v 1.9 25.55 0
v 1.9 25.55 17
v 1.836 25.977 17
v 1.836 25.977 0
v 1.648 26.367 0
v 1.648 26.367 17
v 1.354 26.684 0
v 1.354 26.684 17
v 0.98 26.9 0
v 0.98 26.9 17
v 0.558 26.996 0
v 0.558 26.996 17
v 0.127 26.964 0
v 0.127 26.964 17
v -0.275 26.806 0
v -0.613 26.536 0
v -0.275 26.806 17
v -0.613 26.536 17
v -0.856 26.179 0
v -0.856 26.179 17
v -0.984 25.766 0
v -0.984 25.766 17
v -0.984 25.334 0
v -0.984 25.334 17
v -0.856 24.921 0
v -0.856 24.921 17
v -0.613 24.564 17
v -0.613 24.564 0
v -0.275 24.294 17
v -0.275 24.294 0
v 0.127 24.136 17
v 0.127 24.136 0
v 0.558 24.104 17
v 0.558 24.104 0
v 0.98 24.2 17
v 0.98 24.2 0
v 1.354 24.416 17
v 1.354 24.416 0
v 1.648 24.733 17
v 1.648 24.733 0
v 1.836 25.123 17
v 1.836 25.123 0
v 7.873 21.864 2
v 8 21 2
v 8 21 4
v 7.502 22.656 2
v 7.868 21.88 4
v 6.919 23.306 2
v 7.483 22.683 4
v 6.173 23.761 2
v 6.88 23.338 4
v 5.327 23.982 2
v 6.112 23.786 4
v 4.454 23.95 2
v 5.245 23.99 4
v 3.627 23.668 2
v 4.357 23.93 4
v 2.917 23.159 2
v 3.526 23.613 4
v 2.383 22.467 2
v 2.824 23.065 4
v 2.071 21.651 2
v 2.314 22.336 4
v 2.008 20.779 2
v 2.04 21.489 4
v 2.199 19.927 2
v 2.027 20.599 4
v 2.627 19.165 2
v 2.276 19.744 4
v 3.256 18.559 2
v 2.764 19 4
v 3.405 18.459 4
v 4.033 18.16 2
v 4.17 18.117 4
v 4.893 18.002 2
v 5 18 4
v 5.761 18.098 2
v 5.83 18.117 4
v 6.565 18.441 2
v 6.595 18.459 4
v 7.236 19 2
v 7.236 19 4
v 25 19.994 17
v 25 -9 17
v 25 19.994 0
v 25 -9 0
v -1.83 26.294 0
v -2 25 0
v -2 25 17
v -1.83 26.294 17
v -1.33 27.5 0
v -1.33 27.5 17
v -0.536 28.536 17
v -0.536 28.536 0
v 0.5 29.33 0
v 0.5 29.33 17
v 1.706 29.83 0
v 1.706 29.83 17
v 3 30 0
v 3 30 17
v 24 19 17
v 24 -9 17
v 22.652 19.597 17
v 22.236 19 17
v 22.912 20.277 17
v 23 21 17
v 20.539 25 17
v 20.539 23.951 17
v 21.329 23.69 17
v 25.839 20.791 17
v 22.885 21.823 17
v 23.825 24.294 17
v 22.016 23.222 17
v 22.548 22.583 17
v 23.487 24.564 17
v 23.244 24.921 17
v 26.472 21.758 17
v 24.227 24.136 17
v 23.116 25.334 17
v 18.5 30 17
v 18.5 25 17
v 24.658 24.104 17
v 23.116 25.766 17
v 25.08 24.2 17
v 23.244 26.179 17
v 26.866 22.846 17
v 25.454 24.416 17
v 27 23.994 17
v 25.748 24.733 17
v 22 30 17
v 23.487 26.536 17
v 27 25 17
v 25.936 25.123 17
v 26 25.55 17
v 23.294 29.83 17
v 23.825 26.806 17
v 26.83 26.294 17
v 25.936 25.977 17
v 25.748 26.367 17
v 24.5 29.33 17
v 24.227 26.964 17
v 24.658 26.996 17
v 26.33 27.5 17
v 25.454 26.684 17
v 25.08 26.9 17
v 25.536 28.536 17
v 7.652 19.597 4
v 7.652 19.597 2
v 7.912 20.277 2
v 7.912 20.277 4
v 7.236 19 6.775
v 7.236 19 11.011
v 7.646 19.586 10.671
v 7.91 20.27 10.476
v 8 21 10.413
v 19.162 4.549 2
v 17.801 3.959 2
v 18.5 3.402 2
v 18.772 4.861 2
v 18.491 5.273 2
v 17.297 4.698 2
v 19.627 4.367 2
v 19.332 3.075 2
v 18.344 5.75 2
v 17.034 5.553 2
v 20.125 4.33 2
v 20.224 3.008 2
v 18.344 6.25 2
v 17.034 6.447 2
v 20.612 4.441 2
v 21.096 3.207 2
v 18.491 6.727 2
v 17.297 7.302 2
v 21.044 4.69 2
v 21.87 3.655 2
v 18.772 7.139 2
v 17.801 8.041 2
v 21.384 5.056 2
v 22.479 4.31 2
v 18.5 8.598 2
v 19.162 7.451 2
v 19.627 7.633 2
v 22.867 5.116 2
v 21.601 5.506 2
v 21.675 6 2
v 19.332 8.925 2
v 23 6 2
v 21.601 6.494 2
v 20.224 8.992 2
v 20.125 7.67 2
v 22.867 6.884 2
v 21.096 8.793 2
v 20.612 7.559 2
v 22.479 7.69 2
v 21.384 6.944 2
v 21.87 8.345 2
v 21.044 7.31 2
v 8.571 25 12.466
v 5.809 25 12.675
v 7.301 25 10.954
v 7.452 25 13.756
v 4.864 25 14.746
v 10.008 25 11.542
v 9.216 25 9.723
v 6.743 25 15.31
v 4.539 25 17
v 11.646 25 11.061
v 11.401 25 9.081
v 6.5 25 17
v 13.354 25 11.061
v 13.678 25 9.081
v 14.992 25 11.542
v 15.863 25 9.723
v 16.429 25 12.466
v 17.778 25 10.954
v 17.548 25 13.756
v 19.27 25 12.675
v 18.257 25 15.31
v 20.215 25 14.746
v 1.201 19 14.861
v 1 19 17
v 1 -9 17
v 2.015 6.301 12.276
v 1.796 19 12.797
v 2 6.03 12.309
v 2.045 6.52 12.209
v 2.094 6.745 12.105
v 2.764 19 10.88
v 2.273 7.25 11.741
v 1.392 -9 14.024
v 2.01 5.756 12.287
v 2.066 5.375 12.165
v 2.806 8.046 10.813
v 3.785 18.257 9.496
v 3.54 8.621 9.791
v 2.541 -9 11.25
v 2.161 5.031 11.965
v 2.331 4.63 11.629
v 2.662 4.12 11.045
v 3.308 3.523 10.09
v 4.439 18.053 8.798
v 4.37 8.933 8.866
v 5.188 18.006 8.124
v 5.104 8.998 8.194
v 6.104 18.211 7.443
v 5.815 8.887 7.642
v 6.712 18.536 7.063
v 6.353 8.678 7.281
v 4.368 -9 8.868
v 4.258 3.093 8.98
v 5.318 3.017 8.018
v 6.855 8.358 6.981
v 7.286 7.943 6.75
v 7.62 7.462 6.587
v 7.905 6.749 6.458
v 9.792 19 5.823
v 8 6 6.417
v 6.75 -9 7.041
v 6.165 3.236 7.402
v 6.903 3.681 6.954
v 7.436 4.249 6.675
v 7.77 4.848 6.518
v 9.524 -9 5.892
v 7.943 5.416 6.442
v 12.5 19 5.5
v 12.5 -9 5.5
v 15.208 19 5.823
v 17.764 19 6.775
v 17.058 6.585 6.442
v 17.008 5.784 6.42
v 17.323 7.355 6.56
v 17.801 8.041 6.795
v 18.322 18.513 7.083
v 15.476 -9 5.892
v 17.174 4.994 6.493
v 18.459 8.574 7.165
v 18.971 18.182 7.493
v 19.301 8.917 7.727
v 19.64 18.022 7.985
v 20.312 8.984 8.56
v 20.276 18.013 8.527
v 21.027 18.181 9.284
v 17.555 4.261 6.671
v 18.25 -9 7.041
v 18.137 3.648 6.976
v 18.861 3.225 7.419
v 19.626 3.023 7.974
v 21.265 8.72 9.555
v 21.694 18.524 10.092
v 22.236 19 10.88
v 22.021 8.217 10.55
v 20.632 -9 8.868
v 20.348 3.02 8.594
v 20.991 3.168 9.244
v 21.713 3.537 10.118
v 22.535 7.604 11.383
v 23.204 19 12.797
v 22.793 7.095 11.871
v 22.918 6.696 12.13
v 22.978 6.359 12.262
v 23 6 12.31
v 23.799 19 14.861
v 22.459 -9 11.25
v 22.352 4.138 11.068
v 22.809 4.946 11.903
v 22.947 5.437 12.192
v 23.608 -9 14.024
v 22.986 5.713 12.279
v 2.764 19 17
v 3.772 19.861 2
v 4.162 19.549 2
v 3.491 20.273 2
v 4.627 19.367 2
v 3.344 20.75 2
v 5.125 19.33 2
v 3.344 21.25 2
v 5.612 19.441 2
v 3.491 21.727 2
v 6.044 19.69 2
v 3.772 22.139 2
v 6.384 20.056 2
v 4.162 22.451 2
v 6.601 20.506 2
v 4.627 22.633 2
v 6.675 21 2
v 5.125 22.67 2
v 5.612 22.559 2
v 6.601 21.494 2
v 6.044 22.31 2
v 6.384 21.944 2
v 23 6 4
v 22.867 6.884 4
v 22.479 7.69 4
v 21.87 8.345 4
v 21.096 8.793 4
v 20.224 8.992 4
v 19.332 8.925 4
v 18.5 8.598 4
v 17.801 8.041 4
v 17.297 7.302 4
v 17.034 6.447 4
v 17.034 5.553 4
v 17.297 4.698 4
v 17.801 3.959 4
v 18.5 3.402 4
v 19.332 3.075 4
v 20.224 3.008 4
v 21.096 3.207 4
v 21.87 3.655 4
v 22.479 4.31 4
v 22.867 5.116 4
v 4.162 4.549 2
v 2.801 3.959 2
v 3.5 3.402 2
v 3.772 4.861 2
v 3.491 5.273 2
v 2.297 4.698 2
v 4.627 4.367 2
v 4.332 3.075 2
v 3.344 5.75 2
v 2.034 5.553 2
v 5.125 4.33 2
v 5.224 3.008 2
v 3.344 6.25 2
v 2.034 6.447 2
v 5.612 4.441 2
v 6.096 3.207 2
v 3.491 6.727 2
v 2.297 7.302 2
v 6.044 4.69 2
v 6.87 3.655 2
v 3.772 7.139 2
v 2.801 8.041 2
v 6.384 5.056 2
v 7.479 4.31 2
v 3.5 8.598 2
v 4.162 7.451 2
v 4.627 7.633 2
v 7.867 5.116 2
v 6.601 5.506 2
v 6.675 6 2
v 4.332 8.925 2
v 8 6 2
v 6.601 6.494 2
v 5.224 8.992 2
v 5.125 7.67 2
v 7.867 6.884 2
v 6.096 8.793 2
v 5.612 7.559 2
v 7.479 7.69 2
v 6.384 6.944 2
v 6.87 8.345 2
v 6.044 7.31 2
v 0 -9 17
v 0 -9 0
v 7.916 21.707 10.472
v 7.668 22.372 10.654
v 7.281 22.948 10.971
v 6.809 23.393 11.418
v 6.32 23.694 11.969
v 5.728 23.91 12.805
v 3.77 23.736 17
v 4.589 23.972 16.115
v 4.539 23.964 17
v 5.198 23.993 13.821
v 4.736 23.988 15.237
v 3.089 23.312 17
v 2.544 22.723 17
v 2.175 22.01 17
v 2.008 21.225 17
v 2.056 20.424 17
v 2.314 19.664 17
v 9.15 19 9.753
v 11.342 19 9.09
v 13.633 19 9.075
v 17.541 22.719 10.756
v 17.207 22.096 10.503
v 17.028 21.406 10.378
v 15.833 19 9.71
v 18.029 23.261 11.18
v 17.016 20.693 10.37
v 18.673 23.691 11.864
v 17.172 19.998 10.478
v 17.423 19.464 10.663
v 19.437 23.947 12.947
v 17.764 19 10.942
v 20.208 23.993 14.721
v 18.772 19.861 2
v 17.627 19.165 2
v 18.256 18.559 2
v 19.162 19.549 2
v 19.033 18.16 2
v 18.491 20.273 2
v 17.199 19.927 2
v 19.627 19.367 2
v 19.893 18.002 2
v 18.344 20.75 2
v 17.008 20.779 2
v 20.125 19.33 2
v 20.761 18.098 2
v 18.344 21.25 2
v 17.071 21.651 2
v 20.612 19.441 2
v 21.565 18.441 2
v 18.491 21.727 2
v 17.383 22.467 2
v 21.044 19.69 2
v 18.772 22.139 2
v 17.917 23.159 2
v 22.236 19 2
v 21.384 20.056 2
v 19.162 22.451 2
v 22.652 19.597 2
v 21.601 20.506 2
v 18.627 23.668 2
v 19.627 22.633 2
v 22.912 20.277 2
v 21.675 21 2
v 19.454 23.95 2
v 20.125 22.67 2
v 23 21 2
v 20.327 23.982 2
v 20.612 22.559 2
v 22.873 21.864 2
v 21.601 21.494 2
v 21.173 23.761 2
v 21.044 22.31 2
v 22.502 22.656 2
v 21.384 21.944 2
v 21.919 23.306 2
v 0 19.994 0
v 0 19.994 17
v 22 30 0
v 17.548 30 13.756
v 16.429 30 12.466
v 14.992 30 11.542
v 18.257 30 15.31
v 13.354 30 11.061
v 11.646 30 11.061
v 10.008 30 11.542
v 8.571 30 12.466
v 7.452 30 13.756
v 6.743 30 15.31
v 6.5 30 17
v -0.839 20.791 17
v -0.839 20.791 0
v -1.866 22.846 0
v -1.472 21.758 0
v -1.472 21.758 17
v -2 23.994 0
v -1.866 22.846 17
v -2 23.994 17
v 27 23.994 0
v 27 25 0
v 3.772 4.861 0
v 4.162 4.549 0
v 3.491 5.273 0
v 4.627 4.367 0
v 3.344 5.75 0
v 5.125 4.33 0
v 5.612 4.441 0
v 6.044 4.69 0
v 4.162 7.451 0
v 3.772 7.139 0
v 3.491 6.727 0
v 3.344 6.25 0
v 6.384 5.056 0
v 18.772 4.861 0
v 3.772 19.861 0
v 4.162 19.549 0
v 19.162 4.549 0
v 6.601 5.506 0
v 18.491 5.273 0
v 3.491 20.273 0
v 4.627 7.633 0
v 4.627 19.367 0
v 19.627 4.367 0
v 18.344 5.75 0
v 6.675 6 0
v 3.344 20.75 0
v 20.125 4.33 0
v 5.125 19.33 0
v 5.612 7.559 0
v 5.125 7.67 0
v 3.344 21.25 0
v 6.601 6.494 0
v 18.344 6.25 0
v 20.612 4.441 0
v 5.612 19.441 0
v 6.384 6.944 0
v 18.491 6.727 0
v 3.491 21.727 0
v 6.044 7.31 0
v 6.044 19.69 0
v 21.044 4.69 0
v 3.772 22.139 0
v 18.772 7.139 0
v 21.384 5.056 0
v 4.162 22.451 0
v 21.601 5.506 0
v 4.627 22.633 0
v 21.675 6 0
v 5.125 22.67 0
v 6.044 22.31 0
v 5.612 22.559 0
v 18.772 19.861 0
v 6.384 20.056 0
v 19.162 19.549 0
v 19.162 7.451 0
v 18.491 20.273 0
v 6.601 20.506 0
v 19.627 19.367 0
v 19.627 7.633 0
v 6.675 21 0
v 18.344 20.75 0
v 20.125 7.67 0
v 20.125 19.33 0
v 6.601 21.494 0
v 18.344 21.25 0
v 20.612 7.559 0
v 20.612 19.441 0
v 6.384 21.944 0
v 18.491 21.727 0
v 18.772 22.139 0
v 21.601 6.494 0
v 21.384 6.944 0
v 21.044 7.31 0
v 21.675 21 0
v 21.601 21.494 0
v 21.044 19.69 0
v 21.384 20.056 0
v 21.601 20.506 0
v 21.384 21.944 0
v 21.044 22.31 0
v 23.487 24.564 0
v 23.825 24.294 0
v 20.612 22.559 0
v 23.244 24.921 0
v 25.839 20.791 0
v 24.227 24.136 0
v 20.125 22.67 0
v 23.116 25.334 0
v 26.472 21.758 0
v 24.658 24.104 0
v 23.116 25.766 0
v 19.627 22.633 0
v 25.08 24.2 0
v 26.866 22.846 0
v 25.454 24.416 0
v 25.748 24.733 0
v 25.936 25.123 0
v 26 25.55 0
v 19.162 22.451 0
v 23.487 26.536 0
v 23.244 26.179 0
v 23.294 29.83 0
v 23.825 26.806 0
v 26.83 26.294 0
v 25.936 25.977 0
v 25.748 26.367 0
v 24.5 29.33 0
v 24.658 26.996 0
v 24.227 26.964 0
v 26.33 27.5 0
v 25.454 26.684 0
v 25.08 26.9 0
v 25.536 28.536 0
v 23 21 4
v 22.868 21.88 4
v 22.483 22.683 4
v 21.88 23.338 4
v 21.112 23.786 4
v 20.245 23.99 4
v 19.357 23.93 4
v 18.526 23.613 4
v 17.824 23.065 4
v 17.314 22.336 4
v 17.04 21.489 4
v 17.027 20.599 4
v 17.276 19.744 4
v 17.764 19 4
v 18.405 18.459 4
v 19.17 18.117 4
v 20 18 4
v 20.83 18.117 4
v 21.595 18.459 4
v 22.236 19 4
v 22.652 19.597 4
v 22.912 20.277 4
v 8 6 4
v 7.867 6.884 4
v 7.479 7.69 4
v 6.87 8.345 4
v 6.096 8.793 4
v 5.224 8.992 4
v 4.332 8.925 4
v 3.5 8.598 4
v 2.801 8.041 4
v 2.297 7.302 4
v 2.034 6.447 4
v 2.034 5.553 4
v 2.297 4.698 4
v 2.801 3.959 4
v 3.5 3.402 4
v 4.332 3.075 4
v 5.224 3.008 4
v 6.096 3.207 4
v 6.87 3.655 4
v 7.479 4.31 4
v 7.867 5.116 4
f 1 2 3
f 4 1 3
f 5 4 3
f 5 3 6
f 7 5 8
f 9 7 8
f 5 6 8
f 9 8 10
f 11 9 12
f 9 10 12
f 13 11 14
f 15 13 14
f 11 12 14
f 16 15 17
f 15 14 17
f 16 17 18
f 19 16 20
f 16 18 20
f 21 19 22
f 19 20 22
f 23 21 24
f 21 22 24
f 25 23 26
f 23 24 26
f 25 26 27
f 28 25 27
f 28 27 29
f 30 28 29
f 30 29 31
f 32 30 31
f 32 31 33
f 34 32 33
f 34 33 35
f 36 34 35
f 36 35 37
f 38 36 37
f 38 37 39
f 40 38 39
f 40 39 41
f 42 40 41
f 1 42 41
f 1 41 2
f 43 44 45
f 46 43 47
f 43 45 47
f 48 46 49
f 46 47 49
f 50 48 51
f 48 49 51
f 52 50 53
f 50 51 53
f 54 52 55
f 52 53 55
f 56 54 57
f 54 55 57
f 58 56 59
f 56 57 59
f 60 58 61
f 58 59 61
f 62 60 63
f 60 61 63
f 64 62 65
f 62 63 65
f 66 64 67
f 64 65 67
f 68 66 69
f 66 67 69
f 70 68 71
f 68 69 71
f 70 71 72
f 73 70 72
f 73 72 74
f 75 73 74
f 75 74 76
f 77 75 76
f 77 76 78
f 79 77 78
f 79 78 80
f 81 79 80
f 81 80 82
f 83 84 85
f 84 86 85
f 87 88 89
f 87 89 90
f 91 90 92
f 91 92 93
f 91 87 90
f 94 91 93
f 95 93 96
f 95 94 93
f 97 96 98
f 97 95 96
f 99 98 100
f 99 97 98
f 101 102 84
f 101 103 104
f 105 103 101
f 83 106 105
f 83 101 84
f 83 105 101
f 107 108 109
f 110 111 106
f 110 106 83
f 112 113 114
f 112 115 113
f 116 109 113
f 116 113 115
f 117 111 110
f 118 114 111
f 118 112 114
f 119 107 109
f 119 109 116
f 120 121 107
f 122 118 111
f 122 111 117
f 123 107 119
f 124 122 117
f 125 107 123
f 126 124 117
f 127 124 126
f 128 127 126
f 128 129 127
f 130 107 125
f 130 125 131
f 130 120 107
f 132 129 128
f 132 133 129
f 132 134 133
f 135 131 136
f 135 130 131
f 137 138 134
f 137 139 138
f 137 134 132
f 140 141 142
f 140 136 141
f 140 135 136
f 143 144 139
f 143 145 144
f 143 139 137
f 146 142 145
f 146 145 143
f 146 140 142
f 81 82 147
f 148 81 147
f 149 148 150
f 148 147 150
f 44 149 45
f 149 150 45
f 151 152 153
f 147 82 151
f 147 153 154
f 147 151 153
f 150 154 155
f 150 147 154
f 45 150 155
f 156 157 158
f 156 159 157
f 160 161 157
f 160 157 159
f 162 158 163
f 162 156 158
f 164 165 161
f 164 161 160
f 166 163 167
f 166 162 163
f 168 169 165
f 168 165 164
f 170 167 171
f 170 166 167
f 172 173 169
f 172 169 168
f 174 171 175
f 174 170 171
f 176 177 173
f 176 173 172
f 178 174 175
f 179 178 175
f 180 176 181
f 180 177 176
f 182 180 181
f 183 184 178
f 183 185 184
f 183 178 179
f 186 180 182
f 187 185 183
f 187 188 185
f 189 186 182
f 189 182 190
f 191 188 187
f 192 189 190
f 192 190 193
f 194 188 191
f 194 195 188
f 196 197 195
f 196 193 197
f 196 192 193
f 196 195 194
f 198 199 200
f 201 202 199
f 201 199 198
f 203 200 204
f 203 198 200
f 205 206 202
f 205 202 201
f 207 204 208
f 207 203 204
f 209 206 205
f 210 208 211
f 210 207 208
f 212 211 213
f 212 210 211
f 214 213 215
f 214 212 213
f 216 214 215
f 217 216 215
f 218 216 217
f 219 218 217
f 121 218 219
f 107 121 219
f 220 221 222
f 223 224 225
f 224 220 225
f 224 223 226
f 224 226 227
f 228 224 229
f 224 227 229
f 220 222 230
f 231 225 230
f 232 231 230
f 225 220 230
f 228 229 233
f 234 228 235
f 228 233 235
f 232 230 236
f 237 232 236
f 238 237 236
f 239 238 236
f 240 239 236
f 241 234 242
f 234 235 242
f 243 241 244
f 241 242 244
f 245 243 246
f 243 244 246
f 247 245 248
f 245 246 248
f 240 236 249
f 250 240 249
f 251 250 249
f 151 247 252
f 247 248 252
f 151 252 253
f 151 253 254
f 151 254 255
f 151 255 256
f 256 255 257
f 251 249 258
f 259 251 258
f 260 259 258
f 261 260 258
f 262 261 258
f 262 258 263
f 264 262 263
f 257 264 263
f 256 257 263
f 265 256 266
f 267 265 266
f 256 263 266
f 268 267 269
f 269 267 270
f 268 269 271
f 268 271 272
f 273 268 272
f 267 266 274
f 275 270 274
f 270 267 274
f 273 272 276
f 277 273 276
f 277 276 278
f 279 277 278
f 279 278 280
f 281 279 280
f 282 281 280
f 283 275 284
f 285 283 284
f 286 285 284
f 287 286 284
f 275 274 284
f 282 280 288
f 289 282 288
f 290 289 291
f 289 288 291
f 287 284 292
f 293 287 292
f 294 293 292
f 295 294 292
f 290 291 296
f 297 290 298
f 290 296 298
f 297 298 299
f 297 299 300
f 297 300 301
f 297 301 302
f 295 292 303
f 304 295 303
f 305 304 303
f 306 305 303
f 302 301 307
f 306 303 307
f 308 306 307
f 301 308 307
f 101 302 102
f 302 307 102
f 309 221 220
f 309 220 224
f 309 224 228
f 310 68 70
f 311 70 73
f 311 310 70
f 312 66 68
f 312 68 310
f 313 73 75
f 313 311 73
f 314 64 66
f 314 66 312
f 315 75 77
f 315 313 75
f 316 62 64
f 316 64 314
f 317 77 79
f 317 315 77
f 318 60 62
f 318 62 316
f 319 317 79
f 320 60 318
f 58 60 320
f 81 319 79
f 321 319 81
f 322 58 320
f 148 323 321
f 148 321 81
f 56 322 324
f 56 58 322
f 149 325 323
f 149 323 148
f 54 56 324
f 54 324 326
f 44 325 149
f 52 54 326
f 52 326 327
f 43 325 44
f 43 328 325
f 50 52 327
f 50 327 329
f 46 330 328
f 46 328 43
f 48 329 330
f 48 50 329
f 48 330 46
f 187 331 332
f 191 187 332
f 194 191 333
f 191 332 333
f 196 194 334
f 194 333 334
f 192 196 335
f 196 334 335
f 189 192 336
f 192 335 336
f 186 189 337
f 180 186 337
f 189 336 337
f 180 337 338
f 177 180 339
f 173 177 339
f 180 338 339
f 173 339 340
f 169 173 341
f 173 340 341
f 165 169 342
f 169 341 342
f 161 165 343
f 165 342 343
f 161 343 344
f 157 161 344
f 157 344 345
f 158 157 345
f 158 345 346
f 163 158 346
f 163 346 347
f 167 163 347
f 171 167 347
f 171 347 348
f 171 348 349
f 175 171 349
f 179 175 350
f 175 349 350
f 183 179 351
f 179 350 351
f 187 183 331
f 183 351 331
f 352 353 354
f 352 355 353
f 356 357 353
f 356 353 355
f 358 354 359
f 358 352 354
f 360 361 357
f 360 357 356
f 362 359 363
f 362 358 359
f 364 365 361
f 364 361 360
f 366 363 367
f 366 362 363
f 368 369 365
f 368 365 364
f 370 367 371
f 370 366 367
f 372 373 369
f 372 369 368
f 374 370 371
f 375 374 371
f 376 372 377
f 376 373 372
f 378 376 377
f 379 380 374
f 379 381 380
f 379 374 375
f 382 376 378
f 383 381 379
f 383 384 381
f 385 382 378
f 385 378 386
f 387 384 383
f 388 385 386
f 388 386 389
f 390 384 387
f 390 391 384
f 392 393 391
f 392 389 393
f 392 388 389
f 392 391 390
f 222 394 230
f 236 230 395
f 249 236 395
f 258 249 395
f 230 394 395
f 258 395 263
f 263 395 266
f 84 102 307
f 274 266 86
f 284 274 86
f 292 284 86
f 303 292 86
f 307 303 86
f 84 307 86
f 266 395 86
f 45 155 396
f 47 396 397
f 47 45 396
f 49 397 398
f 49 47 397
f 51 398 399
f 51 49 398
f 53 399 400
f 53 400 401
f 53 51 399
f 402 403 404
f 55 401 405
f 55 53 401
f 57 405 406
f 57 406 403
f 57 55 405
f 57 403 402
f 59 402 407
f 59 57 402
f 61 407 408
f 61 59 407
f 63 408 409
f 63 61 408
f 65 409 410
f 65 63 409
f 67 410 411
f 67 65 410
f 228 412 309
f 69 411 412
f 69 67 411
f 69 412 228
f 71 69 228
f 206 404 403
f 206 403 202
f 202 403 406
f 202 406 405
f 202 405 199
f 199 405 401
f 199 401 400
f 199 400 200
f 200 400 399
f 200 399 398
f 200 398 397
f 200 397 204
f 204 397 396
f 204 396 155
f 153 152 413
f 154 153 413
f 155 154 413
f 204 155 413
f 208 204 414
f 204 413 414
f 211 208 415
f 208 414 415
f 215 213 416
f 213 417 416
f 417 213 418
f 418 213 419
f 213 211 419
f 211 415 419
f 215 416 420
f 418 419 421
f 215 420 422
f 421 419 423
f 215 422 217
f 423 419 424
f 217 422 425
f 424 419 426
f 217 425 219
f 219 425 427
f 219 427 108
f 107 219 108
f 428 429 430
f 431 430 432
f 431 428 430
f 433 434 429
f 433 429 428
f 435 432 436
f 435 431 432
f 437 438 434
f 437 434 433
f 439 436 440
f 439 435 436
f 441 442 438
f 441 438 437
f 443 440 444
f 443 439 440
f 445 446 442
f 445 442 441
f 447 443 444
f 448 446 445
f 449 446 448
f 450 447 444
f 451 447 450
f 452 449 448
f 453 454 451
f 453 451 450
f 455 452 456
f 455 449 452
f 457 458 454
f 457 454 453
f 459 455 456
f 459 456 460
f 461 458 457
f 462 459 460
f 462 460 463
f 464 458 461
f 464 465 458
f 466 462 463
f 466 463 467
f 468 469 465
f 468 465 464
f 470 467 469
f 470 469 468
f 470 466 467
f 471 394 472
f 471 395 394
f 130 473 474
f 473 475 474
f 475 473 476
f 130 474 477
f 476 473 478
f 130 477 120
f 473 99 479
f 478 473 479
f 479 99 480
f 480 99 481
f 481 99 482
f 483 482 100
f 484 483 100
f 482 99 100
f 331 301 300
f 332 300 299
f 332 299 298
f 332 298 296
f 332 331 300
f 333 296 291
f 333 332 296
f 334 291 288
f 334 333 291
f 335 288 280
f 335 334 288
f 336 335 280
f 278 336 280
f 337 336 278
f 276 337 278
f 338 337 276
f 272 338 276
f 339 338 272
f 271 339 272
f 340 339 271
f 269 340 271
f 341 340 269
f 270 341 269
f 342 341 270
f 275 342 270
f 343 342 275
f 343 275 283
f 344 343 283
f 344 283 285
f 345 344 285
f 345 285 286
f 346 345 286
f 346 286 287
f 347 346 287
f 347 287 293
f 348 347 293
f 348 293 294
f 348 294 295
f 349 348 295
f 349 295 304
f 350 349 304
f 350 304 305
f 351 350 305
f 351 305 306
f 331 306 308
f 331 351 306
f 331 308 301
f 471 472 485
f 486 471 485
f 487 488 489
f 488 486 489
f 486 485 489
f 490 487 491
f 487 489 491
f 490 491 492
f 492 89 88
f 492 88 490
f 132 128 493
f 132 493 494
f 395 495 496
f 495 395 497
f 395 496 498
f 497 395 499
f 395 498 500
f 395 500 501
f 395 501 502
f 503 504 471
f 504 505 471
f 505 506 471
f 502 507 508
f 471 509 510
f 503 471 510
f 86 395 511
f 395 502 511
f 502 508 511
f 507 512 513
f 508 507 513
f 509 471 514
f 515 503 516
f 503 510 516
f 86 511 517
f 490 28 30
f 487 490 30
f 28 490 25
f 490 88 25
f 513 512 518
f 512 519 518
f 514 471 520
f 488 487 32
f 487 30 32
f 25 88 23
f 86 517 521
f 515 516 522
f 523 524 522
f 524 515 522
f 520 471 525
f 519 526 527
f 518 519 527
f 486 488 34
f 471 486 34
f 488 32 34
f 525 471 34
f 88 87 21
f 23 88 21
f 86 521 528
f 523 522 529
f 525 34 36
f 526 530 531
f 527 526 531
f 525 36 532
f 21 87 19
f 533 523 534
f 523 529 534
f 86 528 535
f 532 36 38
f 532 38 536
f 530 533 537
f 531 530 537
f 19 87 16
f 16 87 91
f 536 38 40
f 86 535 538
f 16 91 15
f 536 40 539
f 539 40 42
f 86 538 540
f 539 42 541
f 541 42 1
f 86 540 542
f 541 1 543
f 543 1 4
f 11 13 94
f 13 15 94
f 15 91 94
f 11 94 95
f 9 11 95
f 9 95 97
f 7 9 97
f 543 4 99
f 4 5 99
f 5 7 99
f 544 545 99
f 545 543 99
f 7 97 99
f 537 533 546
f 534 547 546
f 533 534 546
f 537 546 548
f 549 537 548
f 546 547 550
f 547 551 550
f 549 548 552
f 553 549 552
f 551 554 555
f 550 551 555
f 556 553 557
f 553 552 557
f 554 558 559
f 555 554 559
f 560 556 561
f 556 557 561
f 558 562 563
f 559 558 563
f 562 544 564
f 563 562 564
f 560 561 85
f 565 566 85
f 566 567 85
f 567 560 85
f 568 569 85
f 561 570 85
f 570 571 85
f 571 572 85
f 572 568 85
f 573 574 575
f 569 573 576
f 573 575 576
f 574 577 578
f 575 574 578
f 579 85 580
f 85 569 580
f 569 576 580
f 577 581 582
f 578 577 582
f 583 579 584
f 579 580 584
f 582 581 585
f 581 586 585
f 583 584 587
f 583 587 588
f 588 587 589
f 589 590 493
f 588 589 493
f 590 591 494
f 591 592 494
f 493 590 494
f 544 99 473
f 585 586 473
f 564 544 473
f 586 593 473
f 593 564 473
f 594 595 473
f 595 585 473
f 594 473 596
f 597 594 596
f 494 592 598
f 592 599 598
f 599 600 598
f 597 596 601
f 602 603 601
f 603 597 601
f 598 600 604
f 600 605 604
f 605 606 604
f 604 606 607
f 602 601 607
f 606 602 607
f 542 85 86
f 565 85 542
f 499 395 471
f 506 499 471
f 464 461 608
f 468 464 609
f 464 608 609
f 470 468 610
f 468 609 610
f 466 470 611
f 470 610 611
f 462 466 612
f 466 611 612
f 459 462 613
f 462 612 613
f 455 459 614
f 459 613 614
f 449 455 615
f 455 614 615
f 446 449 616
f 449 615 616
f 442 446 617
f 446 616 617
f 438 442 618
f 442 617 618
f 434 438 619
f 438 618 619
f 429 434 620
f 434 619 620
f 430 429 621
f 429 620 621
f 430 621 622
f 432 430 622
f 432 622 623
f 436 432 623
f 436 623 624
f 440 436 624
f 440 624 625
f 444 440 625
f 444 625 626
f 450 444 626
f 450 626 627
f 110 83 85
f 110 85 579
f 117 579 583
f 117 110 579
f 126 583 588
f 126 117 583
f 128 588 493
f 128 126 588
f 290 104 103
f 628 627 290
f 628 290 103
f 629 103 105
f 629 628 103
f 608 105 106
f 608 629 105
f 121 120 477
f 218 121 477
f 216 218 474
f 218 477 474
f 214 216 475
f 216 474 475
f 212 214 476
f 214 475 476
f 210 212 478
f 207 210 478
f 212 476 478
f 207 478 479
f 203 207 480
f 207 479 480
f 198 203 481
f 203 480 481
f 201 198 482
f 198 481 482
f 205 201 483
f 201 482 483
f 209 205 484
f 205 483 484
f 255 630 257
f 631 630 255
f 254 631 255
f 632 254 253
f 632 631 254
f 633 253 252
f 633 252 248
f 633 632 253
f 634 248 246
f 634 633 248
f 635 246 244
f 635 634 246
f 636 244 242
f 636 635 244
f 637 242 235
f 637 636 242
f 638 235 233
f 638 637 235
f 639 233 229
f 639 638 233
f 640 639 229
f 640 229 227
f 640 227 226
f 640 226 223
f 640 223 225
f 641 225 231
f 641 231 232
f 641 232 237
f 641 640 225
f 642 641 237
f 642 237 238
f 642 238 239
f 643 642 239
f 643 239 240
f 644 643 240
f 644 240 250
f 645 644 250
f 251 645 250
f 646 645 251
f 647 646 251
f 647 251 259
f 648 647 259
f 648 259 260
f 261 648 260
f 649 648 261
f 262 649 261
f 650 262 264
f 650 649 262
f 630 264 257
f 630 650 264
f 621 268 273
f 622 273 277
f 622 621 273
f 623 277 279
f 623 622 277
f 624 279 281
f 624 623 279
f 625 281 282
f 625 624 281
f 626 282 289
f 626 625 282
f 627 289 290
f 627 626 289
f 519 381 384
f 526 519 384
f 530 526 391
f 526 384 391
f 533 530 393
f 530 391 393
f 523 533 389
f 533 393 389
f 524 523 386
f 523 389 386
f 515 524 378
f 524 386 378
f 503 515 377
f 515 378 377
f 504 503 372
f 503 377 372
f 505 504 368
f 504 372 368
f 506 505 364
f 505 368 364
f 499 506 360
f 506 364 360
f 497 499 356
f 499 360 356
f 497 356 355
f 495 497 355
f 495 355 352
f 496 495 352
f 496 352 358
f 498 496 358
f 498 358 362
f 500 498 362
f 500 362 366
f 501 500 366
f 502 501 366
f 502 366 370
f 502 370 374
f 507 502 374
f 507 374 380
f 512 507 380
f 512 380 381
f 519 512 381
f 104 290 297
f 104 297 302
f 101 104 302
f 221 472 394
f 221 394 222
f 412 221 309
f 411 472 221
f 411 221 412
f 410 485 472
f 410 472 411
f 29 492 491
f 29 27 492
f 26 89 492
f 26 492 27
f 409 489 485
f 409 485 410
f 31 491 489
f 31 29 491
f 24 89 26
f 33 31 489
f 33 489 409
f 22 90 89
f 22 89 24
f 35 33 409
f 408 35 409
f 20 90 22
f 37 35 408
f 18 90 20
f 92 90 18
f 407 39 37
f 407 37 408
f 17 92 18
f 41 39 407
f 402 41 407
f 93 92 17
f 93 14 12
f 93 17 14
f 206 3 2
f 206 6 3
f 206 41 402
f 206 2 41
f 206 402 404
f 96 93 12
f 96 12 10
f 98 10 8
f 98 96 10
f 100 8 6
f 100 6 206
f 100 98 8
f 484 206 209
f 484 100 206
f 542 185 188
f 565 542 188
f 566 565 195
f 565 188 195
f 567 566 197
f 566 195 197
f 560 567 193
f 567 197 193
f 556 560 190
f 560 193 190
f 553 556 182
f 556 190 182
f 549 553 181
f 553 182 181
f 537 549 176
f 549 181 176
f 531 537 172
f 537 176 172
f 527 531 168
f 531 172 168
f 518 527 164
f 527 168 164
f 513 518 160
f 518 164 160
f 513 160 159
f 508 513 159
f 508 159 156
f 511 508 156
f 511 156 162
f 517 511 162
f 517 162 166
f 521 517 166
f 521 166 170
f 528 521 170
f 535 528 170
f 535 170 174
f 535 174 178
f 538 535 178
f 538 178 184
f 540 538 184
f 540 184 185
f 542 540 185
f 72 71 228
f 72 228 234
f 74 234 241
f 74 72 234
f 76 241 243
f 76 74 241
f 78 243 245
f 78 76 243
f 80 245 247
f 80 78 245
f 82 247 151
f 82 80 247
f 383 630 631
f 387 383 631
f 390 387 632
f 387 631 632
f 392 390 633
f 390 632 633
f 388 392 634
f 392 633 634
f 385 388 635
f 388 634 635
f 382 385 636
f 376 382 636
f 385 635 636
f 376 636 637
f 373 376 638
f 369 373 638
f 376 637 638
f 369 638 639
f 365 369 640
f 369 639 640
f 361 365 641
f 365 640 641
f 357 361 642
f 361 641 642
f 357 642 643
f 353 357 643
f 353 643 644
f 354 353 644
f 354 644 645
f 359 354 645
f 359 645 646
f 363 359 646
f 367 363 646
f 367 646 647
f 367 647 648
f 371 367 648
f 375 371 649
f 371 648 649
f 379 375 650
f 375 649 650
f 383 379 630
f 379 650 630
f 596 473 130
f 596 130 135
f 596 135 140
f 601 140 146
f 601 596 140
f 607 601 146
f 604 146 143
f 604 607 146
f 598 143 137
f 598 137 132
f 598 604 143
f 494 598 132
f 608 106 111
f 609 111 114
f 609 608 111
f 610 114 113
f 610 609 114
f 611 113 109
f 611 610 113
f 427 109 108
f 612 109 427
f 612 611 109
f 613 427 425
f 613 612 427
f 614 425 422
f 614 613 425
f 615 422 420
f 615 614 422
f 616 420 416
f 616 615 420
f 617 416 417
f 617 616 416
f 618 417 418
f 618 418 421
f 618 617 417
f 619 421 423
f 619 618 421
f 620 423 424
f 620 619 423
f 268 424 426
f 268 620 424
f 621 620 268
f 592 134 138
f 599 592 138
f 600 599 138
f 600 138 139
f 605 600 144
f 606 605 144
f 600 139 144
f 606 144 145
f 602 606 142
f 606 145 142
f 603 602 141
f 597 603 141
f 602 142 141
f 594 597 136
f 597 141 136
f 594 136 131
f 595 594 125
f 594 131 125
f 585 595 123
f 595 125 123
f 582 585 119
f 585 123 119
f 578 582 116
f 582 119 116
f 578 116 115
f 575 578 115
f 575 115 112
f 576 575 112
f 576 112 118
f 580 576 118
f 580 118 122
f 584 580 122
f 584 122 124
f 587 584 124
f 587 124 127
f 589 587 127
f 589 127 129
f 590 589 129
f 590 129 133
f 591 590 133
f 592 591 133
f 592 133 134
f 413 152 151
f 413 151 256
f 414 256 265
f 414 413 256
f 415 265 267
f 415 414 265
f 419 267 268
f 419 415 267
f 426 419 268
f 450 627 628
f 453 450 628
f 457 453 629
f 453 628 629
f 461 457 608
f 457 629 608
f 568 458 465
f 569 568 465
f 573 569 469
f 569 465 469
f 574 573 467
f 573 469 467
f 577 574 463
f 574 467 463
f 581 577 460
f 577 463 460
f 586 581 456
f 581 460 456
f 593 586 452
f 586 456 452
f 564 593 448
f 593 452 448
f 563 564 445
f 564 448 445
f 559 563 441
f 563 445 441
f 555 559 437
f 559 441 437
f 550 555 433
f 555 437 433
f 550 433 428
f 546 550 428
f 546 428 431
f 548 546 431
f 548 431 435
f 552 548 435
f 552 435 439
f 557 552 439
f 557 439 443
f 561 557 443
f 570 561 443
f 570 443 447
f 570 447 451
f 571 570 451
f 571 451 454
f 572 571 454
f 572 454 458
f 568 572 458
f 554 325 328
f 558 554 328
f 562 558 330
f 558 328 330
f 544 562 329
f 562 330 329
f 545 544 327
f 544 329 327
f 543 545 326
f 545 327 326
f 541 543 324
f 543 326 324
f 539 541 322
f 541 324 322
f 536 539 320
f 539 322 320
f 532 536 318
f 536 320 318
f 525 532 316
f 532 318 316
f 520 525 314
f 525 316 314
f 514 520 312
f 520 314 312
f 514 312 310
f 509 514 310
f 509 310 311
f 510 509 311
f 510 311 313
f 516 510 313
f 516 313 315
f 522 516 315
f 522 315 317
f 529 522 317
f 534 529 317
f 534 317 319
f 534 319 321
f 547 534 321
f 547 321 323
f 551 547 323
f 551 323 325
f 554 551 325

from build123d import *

# Parameters (mm, degrees)
F0_W           = 25
F0_H           = 30
F1_DEPTH       = 4
F2_W           = 25
F2_H           = 11
F3_DEPTH       = 13
F4_R           = 1.675
F5_DEPTH       = 25
F5_DEPTH_BACK  = 25
F7_DEPTH       = 6
F8_R           = 8
F9_DEPTH       = 6
F4_R_2         = 3
F10_DEPTH      = 2
F10_DEPTH_BACK = 25
F12_DEPTH      = 2
F13_W          = 11
F13_H          = 17
F14_DEPTH      = 2
F15_R          = 1.45
F16_DEPTH      = 25
F17_T1_DEPTH   = 42
F17_T6_DEPTH   = 41.9721204096
F17_T11_DEPTH  = 41.9721204096
F18_DEPTH      = 9
F19_DEPTH      = 13
F21_DEPTH      = 28


# Not quite as in the source:
# - a fillet or chamfer that OpenCascade refuses, or shapes differently, is made with other operations: its cross-section is extruded or revolved along the edge and cut away or added
# - a feature names something its author has since deleted; it is built from what else it names


with BuildPart() as f1:
    # F0 (on Top) → F1 (new body)
    with BuildSketch(Plane.XY):
        with Locations((12.5, 15)):
            Rectangle(F0_W, F0_H)
    extrude(amount=F1_DEPTH)

    # F2 (on face) → F3 (join)
    with BuildSketch(Plane.XY.offset(4)):
        with Locations((12.5, 24.5)):
            Rectangle(F2_W, F2_H)
    extrude(amount=F3_DEPTH)

    # F4 (on face) → F5 (cut, two sides)
    with BuildSketch(Plane.XY.offset(4)) as f5_sk:
        with Locations((5, 21)):
            Circle(F4_R)
        with Locations((20, 21)):
            Circle(F4_R)
        with Locations((20, 6)):
            Circle(F4_R)
        with Locations((5, 6)):
            Circle(F4_R)
    extrude(amount=-F5_DEPTH, mode=Mode.SUBTRACT)
    extrude(f5_sk.sketch, amount=F5_DEPTH_BACK, mode=Mode.SUBTRACT)

    # F6 (on face) → F7 (cut)
    with BuildSketch(Plane(origin=(0, 30, 0), x_dir=(-1, 0, 0), z_dir=(0, 1, 0))):
        with BuildLine():
            ThreePointArc((-18.5, 17), (-12.5, 11), (-6.5, 17))
            Line((-6.5, 17), (-18.5, 17))
        make_face()
    extrude(amount=-F7_DEPTH, mode=Mode.SUBTRACT)

    # F8 (on face) → F9 (cut)
    with BuildSketch(Plane.XZ.offset(-19)):
        with Locations((12.5394891948, 17)):
            Circle(F8_R)
    extrude(amount=-F9_DEPTH, mode=Mode.SUBTRACT)

    # F4 (on face) → F10 (cut, two sides)
    with BuildSketch(Plane.XY.offset(4)) as f10_sk:
        with BuildLine():
            ThreePointArc((7.2360679775, 19), (7.8025170769, 19.9295337307), (8, 21))
            ThreePointArc((8, 21), (3.9295337307, 23.8025170769), (2.7639320225, 19))
            Line((2.7639320225, 19), (7.2360679775, 19))
        make_face()
        with Locations((5, 21)):
            Circle(F4_R, mode=Mode.SUBTRACT)
        with BuildLine():
            ThreePointArc((23, 21), (18.9295337307, 23.8025170769), (17.7639320225, 19))
            Line((17.7639320225, 19), (22.2360679775, 19))
            ThreePointArc((22.2360679775, 19), (22.8025170769, 19.9295337307), (23, 21))
        make_face()
        with Locations((20, 21)):
            Circle(F4_R, mode=Mode.SUBTRACT)
        with Locations((20, 6)):
            Circle(F4_R_2)
        with Locations((20, 6)):
            Circle(F4_R, mode=Mode.SUBTRACT)
        with Locations((5, 6)):
            Circle(F4_R_2)
        with Locations((5, 6)):
            Circle(F4_R, mode=Mode.SUBTRACT)
        with BuildLine():
            Line((22.2360679775, 19), (17.7639320225, 19))
            ThreePointArc((17.7639320225, 19), (20, 18), (22.2360679775, 19))
        make_face()
        with BuildLine():
            Line((7.2360679775, 19), (2.7639320225, 19))
            ThreePointArc((2.7639320225, 19), (5, 18), (7.2360679775, 19))
        make_face()
    extrude(amount=-F10_DEPTH, mode=Mode.SUBTRACT)
    extrude(f10_sk.sketch, amount=F10_DEPTH_BACK, mode=Mode.SUBTRACT)

    # F11 (on face) → F12 (join)
    with BuildSketch(Plane(origin=(0, 0, 0), x_dir=(0, -1, 0), z_dir=(-1, 0, 0))):
        Polygon((-30, 17), (-30, 0), (-19, 0), (-19, 4), (-19, 17), align=None)
    extrude(amount=F12_DEPTH)

    # F13 (on face) → F14 (join)
    with BuildSketch(Plane.YZ.offset(25)):
        with Locations((24.5, 8.5)):
            Rectangle(F13_W, F13_H)
    extrude(amount=F14_DEPTH)

    # F15 (on face) → F16 (cut)
    with BuildSketch(Plane.XY.offset(17)):
        with Locations((0.45, 25.55)):
            Circle(F15_R)
        with Locations((24.55, 25.55)):
            Circle(F15_R)
    extrude(amount=-F16_DEPTH, mode=Mode.SUBTRACT)

    # F17: fillet of radius 5 on 4 edges, made by hand

    # F17_s2 → F17_t1 (cut)
    with BuildSketch(Plane.XY.offset(-12.5)):
        with BuildLine():
            ThreePointArc((-2, 25), (-0.5355339059, 28.5355339059), (3, 30))
            Line((3, 30), (-2, 30))
            Line((-2, 30), (-2, 25))
        make_face()
        with BuildLine():
            ThreePointArc((22, 30), (25.5355339059, 28.5355339059), (27, 25))
            Line((27, 25), (27, 30))
            Line((27, 30), (22, 30))
        make_face()
    extrude(amount=F17_T1_DEPTH, mode=Mode.SUBTRACT)


with BuildPart() as f17_tool4:
    # F17_s5 → F17_t6 (new body)
    with BuildSketch(Plane.XY.offset(29.4860602048)):
        with BuildLine():
            ThreePointArc((2.7639320225, 19), (-0.6180339887, 20.5433619184), (-2, 23.9944240819))
            Line((-2, 23.9944240819), (-2, 19))
            Line((-2, 19), (2.7639320225, 19))
        make_face()
    extrude(amount=-F17_T6_DEPTH)

    split(bisect_by=Plane.YZ, keep=Keep.BOTTOM)


with BuildPart() as f1_1:
    add(f1.part)

    # F17_t3: cut F17_tool4
    add(f17_tool4.part, mode=Mode.SUBTRACT)


with BuildPart() as f17_tool9:
    # F17_s10 → F17_t11 (new body)
    with BuildSketch(Plane.XY.offset(29.4860602048)):
        with BuildLine():
            ThreePointArc((22.2360679775, 19), (25.6180339887, 20.5433619184), (27, 23.9944240819))
            Line((27, 23.9944240819), (27, 19))
            Line((27, 19), (22.2360679775, 19))
        make_face()
    extrude(amount=-F17_T11_DEPTH)

    split(bisect_by=Plane.YZ.offset(25), keep=Keep.TOP)


with BuildPart() as f1_2:
    add(f1_1.part)

    # F17_t8: cut F17_tool9
    add(f17_tool9.part, mode=Mode.SUBTRACT)

    # F18 (add): a face of the model
    f18_faces = [f1_2.faces().sort_by_distance(p)[0] for p in [
        (12.5, 0, 2),
    ]]
    extrude(f18_faces, amount=F18_DEPTH)

    # F19 (add): a face of the model
    f19_faces = [f1_2.faces().sort_by_distance(p)[0] for p in [
        (12.5, 4.7791140559, 4),
    ]]
    extrude(f19_faces, amount=F19_DEPTH)

    # F20 (on face) → F21 (cut, through all)
    with BuildSketch(Plane.XZ.offset(9)):
        with BuildLine():
            ThreePointArc((1, 17), (12.5, 5.5), (24, 17))
            Line((24, 17), (1, 17))
        make_face()
    extrude(amount=-F21_DEPTH, mode=Mode.SUBTRACT)


solid = f1_2.part
